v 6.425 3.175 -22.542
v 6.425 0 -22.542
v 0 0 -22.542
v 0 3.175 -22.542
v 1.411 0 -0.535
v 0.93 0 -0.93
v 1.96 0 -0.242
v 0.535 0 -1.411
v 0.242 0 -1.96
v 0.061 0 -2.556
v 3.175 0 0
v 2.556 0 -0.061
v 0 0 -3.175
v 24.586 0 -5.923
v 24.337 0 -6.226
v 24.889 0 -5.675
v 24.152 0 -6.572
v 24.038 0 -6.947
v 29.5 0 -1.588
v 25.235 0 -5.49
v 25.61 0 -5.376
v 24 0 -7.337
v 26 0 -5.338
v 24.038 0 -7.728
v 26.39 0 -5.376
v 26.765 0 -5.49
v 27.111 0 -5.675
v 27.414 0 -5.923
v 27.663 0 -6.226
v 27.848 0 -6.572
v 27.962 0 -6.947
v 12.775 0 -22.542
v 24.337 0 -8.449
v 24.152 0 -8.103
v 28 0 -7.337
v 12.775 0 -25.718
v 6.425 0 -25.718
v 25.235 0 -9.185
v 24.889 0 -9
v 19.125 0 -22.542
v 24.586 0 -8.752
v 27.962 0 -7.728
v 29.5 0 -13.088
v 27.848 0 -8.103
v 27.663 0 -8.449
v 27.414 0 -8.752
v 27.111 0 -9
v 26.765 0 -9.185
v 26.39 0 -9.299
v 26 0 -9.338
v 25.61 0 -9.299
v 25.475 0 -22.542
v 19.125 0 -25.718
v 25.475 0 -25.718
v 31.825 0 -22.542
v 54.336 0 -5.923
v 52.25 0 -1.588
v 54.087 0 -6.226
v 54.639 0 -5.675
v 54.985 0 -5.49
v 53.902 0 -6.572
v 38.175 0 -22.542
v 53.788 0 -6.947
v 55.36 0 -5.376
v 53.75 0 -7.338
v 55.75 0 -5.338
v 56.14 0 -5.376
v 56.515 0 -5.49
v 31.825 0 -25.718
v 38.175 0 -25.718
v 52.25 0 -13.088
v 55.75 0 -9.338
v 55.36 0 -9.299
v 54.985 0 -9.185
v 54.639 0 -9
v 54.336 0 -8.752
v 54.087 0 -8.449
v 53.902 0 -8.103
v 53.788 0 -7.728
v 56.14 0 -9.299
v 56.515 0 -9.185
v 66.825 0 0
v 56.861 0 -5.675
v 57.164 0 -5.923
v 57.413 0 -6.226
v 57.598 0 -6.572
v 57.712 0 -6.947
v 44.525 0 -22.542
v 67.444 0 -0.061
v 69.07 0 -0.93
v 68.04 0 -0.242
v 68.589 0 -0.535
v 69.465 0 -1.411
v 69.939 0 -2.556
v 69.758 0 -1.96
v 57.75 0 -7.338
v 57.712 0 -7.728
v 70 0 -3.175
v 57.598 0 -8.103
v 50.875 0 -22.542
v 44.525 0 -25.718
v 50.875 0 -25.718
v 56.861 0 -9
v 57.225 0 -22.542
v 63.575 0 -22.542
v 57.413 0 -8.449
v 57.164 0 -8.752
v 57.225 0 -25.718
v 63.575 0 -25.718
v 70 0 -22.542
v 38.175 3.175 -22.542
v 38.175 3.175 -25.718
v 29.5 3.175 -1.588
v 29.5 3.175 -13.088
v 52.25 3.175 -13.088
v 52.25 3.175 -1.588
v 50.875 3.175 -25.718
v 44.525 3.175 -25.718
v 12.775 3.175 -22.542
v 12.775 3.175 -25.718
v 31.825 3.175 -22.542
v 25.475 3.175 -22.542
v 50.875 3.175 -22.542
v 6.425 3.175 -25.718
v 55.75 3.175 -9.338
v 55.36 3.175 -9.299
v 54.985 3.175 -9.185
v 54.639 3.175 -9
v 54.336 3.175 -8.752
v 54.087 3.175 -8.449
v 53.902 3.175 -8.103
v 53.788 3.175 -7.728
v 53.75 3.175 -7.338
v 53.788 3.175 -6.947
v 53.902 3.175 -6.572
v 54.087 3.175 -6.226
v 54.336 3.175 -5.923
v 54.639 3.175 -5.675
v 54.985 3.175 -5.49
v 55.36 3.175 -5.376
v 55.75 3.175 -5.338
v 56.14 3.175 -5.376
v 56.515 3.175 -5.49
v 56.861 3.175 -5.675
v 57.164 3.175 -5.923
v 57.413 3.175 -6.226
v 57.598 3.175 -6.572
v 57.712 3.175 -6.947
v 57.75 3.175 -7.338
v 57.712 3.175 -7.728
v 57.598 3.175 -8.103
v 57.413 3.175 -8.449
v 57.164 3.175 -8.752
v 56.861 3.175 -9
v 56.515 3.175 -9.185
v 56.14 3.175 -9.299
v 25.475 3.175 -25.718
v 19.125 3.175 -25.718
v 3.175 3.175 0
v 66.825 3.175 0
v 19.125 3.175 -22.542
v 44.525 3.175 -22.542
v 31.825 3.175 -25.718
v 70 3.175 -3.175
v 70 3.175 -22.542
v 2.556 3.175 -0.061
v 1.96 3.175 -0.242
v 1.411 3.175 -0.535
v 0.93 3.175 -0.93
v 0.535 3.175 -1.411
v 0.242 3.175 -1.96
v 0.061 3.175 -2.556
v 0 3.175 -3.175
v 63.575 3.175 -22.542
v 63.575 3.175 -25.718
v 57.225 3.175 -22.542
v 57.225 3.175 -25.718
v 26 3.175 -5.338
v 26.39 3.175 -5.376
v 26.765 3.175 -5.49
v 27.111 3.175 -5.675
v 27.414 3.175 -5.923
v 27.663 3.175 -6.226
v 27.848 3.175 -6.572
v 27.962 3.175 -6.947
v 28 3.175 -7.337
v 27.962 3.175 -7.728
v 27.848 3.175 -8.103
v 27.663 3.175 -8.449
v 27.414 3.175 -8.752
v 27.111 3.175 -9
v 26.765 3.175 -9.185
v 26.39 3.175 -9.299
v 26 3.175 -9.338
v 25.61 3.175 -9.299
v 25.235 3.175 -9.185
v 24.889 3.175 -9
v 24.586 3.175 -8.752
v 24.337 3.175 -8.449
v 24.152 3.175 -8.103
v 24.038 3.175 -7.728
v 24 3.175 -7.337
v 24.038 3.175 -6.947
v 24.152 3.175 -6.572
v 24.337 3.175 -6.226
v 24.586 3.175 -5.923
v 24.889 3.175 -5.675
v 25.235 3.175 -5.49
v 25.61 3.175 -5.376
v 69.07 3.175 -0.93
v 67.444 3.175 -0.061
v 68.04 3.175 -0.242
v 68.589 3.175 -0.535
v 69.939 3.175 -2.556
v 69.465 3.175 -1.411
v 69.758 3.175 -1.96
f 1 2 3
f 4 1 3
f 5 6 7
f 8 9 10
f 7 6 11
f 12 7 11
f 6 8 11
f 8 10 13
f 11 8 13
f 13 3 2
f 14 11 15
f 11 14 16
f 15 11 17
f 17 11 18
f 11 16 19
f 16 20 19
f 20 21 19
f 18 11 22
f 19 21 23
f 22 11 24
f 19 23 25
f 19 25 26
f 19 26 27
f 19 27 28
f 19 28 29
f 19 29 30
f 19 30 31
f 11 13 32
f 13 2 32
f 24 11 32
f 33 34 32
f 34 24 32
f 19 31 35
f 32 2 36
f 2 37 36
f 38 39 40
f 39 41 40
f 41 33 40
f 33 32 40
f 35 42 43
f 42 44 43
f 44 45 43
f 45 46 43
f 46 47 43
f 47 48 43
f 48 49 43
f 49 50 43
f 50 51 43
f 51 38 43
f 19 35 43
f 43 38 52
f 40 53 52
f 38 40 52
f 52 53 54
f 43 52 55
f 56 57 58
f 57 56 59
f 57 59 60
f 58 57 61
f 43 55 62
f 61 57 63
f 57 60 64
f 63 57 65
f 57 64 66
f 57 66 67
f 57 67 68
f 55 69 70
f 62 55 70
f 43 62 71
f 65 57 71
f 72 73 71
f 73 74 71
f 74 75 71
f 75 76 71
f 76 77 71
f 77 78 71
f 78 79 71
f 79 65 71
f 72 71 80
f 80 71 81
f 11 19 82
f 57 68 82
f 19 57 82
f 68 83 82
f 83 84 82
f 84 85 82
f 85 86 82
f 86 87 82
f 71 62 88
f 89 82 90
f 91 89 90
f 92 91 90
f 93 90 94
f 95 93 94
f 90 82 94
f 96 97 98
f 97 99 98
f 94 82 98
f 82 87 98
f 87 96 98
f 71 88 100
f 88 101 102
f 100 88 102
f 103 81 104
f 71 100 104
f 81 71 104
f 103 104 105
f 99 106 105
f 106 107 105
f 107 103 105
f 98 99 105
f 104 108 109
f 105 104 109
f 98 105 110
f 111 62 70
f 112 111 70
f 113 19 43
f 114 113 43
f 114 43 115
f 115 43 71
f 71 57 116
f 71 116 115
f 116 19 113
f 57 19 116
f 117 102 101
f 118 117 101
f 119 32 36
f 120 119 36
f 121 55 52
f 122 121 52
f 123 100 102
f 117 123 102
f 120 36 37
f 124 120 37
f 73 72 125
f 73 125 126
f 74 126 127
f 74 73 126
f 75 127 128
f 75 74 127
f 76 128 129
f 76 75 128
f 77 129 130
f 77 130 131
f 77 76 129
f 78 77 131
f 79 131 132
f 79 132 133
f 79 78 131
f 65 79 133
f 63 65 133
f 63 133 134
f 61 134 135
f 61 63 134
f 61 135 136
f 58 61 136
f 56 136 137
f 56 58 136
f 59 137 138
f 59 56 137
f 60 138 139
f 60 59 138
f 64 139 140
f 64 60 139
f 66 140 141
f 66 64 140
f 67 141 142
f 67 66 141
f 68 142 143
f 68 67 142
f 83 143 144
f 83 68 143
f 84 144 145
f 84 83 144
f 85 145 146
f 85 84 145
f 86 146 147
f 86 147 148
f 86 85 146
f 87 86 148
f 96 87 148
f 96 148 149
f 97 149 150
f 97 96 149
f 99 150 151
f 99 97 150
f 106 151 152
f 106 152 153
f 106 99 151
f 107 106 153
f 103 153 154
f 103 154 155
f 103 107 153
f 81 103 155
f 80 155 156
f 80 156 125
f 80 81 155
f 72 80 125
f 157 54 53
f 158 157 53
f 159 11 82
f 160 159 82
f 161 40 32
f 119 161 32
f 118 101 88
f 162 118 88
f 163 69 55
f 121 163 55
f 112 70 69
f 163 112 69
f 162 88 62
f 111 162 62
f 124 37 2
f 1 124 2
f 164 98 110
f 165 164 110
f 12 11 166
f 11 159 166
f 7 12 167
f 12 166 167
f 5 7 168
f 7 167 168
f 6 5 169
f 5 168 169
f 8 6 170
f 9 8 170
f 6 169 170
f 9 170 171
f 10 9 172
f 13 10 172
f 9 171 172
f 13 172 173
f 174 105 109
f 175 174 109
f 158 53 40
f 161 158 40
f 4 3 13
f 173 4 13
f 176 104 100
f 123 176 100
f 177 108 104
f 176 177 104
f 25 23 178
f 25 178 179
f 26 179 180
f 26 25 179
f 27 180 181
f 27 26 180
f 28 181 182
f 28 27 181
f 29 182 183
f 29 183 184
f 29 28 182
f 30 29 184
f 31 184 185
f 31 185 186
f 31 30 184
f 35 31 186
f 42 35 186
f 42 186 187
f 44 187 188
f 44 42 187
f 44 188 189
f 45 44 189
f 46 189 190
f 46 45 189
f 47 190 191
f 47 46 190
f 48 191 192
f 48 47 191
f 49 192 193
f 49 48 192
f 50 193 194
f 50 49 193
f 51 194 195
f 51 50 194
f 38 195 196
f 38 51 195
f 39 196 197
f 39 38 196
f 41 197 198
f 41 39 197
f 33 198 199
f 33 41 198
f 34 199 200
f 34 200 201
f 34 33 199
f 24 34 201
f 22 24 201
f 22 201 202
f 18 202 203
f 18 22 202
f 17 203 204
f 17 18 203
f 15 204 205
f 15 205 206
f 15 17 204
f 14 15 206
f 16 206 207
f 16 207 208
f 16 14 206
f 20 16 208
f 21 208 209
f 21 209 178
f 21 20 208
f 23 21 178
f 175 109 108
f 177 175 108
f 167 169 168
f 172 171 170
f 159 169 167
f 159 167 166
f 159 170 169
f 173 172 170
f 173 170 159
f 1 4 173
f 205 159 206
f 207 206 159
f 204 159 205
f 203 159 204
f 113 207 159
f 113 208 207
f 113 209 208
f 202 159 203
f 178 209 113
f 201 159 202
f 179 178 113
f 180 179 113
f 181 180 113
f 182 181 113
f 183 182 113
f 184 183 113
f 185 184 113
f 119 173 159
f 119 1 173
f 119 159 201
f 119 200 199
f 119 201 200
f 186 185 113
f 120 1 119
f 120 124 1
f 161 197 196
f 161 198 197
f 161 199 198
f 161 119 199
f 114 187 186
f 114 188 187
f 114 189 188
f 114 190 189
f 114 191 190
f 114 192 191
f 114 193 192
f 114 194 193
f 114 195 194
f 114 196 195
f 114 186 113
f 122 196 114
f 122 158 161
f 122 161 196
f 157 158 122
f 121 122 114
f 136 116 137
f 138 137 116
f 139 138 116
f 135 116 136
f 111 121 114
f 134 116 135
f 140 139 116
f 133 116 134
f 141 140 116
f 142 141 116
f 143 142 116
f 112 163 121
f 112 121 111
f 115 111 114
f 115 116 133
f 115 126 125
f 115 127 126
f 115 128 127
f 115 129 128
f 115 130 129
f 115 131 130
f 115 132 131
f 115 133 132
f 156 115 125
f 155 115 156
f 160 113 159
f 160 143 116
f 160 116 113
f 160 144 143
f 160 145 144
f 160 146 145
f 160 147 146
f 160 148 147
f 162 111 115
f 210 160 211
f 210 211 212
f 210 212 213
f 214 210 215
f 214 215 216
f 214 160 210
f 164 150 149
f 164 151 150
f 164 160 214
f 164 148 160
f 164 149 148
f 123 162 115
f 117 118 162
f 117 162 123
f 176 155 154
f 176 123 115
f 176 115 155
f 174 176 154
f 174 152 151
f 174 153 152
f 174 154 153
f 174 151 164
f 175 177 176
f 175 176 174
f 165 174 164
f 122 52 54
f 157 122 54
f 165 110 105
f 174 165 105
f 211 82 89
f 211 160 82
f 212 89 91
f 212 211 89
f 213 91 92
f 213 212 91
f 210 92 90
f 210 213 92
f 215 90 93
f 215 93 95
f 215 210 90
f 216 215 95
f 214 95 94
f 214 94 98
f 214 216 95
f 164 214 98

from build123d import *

# Parameters (mm, degrees)
SKETCH1_R           = 2
SKETCH1_W           = 22.75
SKETCH1_H           = 11.5
BOSS_EXTRUDE1_DEPTH = 3.175
FILLET1_R           = 3.175


with BuildPart() as part:
    # Sketch1 → Boss-Extrude1 (new body)
    with BuildSketch(Plane(origin=(0, 0, 0), x_dir=(1, 0, 0), z_dir=(0, 1, 0))):
        Polygon((0, 0), (70, 0), (70, 22.5425), (63.575, 22.5425), (63.575, 25.7175), (57.225, 25.7175), (57.225, 22.5425), (50.875, 22.5425), (50.875, 25.7175), (44.525, 25.7175), (44.525, 22.5425), (38.175, 22.5425), (38.175, 25.7175), (31.825, 25.7175), (31.825, 22.5425), (25.475, 22.5425), (25.475, 25.7175), (19.125, 25.7175), (19.125, 22.5425), (12.775, 22.5425), (12.775, 25.7175), (6.425, 25.7175), (6.425, 22.5425), (0, 22.5425), align=None)
        with Locations(Location((26, 7.3375, 0), (0, 0, 270))):
            Circle(SKETCH1_R, mode=Mode.SUBTRACT)
        with Locations(Location((55.75, 7.3375, 0), (0, 0, 90))):
            Circle(SKETCH1_R, mode=Mode.SUBTRACT)
        with Locations((40.875, 7.3375)):
            Rectangle(SKETCH1_W, SKETCH1_H, mode=Mode.SUBTRACT)
    extrude(amount=BOSS_EXTRUDE1_DEPTH)

    # Fillet1
    fillet1_edges = [part.edges().sort_by_distance(p)[0] for p in [
        (70, 1.5875, 0),
        (0, 1.5875, 0),
    ]]
    fillet(fillet1_edges, radius=FILLET1_R)


solid = part.part
